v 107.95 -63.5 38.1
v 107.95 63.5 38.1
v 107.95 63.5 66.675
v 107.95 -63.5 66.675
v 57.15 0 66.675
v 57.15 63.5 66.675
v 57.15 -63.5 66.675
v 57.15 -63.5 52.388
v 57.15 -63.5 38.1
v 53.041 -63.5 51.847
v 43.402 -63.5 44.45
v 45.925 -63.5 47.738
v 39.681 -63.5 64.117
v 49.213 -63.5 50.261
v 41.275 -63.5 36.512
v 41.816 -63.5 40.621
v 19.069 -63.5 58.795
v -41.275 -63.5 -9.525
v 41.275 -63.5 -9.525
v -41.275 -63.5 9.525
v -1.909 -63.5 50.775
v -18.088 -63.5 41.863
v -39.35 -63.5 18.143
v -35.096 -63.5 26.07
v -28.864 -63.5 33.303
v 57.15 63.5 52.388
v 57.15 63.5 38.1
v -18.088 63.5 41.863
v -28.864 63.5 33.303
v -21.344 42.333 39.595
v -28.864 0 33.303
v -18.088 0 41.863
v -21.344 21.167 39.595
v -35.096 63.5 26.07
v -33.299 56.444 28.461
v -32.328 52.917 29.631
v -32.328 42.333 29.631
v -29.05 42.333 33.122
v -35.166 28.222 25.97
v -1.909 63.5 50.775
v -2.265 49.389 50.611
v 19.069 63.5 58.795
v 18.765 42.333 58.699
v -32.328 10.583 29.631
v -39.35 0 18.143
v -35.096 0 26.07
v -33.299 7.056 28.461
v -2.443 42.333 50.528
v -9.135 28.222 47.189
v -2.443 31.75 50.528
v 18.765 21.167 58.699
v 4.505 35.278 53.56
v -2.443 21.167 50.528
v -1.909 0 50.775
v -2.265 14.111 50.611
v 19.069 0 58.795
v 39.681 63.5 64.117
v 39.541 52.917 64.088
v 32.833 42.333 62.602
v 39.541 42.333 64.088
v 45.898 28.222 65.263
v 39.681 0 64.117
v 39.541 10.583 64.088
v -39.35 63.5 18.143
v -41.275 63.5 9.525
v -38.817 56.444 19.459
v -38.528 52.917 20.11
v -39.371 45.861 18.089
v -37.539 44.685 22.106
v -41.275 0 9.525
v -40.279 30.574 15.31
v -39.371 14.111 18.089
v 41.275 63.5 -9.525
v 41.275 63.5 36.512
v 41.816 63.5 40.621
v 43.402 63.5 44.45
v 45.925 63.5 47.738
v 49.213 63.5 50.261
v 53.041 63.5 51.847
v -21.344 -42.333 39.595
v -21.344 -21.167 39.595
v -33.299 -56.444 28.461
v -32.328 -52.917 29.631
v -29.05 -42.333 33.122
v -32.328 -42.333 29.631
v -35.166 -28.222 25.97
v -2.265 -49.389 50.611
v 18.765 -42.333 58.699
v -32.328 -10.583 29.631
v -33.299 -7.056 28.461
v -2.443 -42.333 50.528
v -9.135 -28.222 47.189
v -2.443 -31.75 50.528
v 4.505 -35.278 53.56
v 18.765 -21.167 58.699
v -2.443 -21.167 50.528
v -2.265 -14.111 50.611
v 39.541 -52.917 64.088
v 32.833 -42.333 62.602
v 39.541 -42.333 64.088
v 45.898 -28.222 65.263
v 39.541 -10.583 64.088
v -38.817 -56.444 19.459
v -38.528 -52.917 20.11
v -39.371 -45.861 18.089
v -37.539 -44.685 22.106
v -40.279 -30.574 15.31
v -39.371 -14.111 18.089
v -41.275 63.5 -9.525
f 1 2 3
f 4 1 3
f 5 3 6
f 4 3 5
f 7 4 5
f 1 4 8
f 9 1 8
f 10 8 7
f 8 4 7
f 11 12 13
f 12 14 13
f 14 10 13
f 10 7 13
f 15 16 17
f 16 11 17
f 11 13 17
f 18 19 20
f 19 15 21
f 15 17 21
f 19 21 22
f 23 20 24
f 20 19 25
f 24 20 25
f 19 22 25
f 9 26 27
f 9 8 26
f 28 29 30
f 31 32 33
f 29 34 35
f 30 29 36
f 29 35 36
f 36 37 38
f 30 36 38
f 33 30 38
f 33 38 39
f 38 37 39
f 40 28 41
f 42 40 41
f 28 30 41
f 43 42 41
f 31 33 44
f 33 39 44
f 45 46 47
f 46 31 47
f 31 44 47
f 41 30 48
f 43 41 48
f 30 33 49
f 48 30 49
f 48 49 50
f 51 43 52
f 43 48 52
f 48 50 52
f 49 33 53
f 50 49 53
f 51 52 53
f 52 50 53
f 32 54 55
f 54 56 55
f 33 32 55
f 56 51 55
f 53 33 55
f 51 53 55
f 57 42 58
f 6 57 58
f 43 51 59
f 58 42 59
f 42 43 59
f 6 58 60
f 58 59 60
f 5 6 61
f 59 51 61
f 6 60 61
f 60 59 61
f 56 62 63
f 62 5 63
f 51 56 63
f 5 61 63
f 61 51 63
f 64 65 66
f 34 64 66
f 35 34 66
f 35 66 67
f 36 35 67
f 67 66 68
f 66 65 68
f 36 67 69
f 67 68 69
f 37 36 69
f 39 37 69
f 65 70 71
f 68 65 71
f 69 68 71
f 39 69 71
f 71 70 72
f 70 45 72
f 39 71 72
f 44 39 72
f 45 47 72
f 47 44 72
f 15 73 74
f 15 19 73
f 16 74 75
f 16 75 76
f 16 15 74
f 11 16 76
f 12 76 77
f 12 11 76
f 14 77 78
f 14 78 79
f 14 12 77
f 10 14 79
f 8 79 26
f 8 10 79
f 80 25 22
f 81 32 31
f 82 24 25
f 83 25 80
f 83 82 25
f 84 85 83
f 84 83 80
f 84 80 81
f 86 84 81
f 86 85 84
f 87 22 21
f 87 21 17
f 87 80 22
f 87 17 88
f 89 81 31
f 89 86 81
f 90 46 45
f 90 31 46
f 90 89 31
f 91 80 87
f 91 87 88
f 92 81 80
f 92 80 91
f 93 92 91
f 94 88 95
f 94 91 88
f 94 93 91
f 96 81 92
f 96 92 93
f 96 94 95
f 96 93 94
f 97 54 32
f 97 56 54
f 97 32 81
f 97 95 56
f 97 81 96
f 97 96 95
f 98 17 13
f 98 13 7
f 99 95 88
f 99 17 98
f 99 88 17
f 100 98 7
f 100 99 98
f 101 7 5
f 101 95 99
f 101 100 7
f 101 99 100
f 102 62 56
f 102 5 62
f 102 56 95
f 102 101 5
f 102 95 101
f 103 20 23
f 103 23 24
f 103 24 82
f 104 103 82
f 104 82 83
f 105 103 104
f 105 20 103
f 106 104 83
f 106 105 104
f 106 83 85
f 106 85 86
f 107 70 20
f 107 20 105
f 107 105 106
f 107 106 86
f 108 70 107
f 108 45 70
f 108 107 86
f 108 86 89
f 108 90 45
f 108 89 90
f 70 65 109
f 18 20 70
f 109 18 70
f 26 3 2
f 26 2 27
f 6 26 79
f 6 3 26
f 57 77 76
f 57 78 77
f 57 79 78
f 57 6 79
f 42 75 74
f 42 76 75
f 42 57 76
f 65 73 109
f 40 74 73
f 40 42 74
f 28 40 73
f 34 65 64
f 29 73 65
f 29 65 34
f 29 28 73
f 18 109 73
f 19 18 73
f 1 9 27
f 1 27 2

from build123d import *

# Parameters (mm, degrees)
F0_W     = 25.4
F0_H     = 13.97
F1_DEPTH = 63.5


with BuildPart() as f1:
    # F0 (on Front) → F1 (new body, symmetric)
    with BuildSketch(Plane.XZ):
        with BuildLine():
            add(Edge.make_bspline(
                [(-41.275, 9.525), (-38.7320481241, 45.0227931142), (26.9261933863, 64.3182843924), (57.15, 66.675)],
                knots=[0, 0, 0, 0, 113.8138968887, 113.8138968887, 113.8138968887, 113.8138968887], degree=3))
            Line((-41.275, 9.525), (27.305, 9.525))
            Line((27.305, 9.525), (27.305, 36.5125))
            ThreePointArc((27.305, 36.5125), (36.0463981155, 57.6161018845), (57.15, 66.3575))
            Line((57.15, 66.3575), (57.15, 66.675))
        make_face()
        Polygon((27.305, 9.525), (-41.275, 9.525), (-41.275, -9.525), (41.275, -9.525), (41.275, 9.525), align=None)
        with BuildLine():
            Line((27.305, 36.5125), (27.305, 9.525))
            Line((27.305, 9.525), (41.275, 9.525))
            Line((41.275, 9.525), (41.275, 36.5125))
            ThreePointArc((41.275, 36.5125), (45.9246798487, 47.7378201513), (57.15, 52.3875))
            Line((57.15, 52.3875), (57.15, 66.3575))
            ThreePointArc((57.15, 66.3575), (36.0463981155, 57.6161018845), (27.305, 36.5125))
        make_face()
        Polygon((107.95, 66.675), (57.15, 66.675), (57.15, 66.3575), (82.55, 66.3575), (82.55, 52.3875), (57.15, 52.3875), (57.15, 38.1), (107.95, 38.1), align=None)
        with Locations((69.85, 59.3725)):
            Rectangle(F0_W, F0_H)
    extrude(amount=F1_DEPTH, both=True)


solid = f1.part
